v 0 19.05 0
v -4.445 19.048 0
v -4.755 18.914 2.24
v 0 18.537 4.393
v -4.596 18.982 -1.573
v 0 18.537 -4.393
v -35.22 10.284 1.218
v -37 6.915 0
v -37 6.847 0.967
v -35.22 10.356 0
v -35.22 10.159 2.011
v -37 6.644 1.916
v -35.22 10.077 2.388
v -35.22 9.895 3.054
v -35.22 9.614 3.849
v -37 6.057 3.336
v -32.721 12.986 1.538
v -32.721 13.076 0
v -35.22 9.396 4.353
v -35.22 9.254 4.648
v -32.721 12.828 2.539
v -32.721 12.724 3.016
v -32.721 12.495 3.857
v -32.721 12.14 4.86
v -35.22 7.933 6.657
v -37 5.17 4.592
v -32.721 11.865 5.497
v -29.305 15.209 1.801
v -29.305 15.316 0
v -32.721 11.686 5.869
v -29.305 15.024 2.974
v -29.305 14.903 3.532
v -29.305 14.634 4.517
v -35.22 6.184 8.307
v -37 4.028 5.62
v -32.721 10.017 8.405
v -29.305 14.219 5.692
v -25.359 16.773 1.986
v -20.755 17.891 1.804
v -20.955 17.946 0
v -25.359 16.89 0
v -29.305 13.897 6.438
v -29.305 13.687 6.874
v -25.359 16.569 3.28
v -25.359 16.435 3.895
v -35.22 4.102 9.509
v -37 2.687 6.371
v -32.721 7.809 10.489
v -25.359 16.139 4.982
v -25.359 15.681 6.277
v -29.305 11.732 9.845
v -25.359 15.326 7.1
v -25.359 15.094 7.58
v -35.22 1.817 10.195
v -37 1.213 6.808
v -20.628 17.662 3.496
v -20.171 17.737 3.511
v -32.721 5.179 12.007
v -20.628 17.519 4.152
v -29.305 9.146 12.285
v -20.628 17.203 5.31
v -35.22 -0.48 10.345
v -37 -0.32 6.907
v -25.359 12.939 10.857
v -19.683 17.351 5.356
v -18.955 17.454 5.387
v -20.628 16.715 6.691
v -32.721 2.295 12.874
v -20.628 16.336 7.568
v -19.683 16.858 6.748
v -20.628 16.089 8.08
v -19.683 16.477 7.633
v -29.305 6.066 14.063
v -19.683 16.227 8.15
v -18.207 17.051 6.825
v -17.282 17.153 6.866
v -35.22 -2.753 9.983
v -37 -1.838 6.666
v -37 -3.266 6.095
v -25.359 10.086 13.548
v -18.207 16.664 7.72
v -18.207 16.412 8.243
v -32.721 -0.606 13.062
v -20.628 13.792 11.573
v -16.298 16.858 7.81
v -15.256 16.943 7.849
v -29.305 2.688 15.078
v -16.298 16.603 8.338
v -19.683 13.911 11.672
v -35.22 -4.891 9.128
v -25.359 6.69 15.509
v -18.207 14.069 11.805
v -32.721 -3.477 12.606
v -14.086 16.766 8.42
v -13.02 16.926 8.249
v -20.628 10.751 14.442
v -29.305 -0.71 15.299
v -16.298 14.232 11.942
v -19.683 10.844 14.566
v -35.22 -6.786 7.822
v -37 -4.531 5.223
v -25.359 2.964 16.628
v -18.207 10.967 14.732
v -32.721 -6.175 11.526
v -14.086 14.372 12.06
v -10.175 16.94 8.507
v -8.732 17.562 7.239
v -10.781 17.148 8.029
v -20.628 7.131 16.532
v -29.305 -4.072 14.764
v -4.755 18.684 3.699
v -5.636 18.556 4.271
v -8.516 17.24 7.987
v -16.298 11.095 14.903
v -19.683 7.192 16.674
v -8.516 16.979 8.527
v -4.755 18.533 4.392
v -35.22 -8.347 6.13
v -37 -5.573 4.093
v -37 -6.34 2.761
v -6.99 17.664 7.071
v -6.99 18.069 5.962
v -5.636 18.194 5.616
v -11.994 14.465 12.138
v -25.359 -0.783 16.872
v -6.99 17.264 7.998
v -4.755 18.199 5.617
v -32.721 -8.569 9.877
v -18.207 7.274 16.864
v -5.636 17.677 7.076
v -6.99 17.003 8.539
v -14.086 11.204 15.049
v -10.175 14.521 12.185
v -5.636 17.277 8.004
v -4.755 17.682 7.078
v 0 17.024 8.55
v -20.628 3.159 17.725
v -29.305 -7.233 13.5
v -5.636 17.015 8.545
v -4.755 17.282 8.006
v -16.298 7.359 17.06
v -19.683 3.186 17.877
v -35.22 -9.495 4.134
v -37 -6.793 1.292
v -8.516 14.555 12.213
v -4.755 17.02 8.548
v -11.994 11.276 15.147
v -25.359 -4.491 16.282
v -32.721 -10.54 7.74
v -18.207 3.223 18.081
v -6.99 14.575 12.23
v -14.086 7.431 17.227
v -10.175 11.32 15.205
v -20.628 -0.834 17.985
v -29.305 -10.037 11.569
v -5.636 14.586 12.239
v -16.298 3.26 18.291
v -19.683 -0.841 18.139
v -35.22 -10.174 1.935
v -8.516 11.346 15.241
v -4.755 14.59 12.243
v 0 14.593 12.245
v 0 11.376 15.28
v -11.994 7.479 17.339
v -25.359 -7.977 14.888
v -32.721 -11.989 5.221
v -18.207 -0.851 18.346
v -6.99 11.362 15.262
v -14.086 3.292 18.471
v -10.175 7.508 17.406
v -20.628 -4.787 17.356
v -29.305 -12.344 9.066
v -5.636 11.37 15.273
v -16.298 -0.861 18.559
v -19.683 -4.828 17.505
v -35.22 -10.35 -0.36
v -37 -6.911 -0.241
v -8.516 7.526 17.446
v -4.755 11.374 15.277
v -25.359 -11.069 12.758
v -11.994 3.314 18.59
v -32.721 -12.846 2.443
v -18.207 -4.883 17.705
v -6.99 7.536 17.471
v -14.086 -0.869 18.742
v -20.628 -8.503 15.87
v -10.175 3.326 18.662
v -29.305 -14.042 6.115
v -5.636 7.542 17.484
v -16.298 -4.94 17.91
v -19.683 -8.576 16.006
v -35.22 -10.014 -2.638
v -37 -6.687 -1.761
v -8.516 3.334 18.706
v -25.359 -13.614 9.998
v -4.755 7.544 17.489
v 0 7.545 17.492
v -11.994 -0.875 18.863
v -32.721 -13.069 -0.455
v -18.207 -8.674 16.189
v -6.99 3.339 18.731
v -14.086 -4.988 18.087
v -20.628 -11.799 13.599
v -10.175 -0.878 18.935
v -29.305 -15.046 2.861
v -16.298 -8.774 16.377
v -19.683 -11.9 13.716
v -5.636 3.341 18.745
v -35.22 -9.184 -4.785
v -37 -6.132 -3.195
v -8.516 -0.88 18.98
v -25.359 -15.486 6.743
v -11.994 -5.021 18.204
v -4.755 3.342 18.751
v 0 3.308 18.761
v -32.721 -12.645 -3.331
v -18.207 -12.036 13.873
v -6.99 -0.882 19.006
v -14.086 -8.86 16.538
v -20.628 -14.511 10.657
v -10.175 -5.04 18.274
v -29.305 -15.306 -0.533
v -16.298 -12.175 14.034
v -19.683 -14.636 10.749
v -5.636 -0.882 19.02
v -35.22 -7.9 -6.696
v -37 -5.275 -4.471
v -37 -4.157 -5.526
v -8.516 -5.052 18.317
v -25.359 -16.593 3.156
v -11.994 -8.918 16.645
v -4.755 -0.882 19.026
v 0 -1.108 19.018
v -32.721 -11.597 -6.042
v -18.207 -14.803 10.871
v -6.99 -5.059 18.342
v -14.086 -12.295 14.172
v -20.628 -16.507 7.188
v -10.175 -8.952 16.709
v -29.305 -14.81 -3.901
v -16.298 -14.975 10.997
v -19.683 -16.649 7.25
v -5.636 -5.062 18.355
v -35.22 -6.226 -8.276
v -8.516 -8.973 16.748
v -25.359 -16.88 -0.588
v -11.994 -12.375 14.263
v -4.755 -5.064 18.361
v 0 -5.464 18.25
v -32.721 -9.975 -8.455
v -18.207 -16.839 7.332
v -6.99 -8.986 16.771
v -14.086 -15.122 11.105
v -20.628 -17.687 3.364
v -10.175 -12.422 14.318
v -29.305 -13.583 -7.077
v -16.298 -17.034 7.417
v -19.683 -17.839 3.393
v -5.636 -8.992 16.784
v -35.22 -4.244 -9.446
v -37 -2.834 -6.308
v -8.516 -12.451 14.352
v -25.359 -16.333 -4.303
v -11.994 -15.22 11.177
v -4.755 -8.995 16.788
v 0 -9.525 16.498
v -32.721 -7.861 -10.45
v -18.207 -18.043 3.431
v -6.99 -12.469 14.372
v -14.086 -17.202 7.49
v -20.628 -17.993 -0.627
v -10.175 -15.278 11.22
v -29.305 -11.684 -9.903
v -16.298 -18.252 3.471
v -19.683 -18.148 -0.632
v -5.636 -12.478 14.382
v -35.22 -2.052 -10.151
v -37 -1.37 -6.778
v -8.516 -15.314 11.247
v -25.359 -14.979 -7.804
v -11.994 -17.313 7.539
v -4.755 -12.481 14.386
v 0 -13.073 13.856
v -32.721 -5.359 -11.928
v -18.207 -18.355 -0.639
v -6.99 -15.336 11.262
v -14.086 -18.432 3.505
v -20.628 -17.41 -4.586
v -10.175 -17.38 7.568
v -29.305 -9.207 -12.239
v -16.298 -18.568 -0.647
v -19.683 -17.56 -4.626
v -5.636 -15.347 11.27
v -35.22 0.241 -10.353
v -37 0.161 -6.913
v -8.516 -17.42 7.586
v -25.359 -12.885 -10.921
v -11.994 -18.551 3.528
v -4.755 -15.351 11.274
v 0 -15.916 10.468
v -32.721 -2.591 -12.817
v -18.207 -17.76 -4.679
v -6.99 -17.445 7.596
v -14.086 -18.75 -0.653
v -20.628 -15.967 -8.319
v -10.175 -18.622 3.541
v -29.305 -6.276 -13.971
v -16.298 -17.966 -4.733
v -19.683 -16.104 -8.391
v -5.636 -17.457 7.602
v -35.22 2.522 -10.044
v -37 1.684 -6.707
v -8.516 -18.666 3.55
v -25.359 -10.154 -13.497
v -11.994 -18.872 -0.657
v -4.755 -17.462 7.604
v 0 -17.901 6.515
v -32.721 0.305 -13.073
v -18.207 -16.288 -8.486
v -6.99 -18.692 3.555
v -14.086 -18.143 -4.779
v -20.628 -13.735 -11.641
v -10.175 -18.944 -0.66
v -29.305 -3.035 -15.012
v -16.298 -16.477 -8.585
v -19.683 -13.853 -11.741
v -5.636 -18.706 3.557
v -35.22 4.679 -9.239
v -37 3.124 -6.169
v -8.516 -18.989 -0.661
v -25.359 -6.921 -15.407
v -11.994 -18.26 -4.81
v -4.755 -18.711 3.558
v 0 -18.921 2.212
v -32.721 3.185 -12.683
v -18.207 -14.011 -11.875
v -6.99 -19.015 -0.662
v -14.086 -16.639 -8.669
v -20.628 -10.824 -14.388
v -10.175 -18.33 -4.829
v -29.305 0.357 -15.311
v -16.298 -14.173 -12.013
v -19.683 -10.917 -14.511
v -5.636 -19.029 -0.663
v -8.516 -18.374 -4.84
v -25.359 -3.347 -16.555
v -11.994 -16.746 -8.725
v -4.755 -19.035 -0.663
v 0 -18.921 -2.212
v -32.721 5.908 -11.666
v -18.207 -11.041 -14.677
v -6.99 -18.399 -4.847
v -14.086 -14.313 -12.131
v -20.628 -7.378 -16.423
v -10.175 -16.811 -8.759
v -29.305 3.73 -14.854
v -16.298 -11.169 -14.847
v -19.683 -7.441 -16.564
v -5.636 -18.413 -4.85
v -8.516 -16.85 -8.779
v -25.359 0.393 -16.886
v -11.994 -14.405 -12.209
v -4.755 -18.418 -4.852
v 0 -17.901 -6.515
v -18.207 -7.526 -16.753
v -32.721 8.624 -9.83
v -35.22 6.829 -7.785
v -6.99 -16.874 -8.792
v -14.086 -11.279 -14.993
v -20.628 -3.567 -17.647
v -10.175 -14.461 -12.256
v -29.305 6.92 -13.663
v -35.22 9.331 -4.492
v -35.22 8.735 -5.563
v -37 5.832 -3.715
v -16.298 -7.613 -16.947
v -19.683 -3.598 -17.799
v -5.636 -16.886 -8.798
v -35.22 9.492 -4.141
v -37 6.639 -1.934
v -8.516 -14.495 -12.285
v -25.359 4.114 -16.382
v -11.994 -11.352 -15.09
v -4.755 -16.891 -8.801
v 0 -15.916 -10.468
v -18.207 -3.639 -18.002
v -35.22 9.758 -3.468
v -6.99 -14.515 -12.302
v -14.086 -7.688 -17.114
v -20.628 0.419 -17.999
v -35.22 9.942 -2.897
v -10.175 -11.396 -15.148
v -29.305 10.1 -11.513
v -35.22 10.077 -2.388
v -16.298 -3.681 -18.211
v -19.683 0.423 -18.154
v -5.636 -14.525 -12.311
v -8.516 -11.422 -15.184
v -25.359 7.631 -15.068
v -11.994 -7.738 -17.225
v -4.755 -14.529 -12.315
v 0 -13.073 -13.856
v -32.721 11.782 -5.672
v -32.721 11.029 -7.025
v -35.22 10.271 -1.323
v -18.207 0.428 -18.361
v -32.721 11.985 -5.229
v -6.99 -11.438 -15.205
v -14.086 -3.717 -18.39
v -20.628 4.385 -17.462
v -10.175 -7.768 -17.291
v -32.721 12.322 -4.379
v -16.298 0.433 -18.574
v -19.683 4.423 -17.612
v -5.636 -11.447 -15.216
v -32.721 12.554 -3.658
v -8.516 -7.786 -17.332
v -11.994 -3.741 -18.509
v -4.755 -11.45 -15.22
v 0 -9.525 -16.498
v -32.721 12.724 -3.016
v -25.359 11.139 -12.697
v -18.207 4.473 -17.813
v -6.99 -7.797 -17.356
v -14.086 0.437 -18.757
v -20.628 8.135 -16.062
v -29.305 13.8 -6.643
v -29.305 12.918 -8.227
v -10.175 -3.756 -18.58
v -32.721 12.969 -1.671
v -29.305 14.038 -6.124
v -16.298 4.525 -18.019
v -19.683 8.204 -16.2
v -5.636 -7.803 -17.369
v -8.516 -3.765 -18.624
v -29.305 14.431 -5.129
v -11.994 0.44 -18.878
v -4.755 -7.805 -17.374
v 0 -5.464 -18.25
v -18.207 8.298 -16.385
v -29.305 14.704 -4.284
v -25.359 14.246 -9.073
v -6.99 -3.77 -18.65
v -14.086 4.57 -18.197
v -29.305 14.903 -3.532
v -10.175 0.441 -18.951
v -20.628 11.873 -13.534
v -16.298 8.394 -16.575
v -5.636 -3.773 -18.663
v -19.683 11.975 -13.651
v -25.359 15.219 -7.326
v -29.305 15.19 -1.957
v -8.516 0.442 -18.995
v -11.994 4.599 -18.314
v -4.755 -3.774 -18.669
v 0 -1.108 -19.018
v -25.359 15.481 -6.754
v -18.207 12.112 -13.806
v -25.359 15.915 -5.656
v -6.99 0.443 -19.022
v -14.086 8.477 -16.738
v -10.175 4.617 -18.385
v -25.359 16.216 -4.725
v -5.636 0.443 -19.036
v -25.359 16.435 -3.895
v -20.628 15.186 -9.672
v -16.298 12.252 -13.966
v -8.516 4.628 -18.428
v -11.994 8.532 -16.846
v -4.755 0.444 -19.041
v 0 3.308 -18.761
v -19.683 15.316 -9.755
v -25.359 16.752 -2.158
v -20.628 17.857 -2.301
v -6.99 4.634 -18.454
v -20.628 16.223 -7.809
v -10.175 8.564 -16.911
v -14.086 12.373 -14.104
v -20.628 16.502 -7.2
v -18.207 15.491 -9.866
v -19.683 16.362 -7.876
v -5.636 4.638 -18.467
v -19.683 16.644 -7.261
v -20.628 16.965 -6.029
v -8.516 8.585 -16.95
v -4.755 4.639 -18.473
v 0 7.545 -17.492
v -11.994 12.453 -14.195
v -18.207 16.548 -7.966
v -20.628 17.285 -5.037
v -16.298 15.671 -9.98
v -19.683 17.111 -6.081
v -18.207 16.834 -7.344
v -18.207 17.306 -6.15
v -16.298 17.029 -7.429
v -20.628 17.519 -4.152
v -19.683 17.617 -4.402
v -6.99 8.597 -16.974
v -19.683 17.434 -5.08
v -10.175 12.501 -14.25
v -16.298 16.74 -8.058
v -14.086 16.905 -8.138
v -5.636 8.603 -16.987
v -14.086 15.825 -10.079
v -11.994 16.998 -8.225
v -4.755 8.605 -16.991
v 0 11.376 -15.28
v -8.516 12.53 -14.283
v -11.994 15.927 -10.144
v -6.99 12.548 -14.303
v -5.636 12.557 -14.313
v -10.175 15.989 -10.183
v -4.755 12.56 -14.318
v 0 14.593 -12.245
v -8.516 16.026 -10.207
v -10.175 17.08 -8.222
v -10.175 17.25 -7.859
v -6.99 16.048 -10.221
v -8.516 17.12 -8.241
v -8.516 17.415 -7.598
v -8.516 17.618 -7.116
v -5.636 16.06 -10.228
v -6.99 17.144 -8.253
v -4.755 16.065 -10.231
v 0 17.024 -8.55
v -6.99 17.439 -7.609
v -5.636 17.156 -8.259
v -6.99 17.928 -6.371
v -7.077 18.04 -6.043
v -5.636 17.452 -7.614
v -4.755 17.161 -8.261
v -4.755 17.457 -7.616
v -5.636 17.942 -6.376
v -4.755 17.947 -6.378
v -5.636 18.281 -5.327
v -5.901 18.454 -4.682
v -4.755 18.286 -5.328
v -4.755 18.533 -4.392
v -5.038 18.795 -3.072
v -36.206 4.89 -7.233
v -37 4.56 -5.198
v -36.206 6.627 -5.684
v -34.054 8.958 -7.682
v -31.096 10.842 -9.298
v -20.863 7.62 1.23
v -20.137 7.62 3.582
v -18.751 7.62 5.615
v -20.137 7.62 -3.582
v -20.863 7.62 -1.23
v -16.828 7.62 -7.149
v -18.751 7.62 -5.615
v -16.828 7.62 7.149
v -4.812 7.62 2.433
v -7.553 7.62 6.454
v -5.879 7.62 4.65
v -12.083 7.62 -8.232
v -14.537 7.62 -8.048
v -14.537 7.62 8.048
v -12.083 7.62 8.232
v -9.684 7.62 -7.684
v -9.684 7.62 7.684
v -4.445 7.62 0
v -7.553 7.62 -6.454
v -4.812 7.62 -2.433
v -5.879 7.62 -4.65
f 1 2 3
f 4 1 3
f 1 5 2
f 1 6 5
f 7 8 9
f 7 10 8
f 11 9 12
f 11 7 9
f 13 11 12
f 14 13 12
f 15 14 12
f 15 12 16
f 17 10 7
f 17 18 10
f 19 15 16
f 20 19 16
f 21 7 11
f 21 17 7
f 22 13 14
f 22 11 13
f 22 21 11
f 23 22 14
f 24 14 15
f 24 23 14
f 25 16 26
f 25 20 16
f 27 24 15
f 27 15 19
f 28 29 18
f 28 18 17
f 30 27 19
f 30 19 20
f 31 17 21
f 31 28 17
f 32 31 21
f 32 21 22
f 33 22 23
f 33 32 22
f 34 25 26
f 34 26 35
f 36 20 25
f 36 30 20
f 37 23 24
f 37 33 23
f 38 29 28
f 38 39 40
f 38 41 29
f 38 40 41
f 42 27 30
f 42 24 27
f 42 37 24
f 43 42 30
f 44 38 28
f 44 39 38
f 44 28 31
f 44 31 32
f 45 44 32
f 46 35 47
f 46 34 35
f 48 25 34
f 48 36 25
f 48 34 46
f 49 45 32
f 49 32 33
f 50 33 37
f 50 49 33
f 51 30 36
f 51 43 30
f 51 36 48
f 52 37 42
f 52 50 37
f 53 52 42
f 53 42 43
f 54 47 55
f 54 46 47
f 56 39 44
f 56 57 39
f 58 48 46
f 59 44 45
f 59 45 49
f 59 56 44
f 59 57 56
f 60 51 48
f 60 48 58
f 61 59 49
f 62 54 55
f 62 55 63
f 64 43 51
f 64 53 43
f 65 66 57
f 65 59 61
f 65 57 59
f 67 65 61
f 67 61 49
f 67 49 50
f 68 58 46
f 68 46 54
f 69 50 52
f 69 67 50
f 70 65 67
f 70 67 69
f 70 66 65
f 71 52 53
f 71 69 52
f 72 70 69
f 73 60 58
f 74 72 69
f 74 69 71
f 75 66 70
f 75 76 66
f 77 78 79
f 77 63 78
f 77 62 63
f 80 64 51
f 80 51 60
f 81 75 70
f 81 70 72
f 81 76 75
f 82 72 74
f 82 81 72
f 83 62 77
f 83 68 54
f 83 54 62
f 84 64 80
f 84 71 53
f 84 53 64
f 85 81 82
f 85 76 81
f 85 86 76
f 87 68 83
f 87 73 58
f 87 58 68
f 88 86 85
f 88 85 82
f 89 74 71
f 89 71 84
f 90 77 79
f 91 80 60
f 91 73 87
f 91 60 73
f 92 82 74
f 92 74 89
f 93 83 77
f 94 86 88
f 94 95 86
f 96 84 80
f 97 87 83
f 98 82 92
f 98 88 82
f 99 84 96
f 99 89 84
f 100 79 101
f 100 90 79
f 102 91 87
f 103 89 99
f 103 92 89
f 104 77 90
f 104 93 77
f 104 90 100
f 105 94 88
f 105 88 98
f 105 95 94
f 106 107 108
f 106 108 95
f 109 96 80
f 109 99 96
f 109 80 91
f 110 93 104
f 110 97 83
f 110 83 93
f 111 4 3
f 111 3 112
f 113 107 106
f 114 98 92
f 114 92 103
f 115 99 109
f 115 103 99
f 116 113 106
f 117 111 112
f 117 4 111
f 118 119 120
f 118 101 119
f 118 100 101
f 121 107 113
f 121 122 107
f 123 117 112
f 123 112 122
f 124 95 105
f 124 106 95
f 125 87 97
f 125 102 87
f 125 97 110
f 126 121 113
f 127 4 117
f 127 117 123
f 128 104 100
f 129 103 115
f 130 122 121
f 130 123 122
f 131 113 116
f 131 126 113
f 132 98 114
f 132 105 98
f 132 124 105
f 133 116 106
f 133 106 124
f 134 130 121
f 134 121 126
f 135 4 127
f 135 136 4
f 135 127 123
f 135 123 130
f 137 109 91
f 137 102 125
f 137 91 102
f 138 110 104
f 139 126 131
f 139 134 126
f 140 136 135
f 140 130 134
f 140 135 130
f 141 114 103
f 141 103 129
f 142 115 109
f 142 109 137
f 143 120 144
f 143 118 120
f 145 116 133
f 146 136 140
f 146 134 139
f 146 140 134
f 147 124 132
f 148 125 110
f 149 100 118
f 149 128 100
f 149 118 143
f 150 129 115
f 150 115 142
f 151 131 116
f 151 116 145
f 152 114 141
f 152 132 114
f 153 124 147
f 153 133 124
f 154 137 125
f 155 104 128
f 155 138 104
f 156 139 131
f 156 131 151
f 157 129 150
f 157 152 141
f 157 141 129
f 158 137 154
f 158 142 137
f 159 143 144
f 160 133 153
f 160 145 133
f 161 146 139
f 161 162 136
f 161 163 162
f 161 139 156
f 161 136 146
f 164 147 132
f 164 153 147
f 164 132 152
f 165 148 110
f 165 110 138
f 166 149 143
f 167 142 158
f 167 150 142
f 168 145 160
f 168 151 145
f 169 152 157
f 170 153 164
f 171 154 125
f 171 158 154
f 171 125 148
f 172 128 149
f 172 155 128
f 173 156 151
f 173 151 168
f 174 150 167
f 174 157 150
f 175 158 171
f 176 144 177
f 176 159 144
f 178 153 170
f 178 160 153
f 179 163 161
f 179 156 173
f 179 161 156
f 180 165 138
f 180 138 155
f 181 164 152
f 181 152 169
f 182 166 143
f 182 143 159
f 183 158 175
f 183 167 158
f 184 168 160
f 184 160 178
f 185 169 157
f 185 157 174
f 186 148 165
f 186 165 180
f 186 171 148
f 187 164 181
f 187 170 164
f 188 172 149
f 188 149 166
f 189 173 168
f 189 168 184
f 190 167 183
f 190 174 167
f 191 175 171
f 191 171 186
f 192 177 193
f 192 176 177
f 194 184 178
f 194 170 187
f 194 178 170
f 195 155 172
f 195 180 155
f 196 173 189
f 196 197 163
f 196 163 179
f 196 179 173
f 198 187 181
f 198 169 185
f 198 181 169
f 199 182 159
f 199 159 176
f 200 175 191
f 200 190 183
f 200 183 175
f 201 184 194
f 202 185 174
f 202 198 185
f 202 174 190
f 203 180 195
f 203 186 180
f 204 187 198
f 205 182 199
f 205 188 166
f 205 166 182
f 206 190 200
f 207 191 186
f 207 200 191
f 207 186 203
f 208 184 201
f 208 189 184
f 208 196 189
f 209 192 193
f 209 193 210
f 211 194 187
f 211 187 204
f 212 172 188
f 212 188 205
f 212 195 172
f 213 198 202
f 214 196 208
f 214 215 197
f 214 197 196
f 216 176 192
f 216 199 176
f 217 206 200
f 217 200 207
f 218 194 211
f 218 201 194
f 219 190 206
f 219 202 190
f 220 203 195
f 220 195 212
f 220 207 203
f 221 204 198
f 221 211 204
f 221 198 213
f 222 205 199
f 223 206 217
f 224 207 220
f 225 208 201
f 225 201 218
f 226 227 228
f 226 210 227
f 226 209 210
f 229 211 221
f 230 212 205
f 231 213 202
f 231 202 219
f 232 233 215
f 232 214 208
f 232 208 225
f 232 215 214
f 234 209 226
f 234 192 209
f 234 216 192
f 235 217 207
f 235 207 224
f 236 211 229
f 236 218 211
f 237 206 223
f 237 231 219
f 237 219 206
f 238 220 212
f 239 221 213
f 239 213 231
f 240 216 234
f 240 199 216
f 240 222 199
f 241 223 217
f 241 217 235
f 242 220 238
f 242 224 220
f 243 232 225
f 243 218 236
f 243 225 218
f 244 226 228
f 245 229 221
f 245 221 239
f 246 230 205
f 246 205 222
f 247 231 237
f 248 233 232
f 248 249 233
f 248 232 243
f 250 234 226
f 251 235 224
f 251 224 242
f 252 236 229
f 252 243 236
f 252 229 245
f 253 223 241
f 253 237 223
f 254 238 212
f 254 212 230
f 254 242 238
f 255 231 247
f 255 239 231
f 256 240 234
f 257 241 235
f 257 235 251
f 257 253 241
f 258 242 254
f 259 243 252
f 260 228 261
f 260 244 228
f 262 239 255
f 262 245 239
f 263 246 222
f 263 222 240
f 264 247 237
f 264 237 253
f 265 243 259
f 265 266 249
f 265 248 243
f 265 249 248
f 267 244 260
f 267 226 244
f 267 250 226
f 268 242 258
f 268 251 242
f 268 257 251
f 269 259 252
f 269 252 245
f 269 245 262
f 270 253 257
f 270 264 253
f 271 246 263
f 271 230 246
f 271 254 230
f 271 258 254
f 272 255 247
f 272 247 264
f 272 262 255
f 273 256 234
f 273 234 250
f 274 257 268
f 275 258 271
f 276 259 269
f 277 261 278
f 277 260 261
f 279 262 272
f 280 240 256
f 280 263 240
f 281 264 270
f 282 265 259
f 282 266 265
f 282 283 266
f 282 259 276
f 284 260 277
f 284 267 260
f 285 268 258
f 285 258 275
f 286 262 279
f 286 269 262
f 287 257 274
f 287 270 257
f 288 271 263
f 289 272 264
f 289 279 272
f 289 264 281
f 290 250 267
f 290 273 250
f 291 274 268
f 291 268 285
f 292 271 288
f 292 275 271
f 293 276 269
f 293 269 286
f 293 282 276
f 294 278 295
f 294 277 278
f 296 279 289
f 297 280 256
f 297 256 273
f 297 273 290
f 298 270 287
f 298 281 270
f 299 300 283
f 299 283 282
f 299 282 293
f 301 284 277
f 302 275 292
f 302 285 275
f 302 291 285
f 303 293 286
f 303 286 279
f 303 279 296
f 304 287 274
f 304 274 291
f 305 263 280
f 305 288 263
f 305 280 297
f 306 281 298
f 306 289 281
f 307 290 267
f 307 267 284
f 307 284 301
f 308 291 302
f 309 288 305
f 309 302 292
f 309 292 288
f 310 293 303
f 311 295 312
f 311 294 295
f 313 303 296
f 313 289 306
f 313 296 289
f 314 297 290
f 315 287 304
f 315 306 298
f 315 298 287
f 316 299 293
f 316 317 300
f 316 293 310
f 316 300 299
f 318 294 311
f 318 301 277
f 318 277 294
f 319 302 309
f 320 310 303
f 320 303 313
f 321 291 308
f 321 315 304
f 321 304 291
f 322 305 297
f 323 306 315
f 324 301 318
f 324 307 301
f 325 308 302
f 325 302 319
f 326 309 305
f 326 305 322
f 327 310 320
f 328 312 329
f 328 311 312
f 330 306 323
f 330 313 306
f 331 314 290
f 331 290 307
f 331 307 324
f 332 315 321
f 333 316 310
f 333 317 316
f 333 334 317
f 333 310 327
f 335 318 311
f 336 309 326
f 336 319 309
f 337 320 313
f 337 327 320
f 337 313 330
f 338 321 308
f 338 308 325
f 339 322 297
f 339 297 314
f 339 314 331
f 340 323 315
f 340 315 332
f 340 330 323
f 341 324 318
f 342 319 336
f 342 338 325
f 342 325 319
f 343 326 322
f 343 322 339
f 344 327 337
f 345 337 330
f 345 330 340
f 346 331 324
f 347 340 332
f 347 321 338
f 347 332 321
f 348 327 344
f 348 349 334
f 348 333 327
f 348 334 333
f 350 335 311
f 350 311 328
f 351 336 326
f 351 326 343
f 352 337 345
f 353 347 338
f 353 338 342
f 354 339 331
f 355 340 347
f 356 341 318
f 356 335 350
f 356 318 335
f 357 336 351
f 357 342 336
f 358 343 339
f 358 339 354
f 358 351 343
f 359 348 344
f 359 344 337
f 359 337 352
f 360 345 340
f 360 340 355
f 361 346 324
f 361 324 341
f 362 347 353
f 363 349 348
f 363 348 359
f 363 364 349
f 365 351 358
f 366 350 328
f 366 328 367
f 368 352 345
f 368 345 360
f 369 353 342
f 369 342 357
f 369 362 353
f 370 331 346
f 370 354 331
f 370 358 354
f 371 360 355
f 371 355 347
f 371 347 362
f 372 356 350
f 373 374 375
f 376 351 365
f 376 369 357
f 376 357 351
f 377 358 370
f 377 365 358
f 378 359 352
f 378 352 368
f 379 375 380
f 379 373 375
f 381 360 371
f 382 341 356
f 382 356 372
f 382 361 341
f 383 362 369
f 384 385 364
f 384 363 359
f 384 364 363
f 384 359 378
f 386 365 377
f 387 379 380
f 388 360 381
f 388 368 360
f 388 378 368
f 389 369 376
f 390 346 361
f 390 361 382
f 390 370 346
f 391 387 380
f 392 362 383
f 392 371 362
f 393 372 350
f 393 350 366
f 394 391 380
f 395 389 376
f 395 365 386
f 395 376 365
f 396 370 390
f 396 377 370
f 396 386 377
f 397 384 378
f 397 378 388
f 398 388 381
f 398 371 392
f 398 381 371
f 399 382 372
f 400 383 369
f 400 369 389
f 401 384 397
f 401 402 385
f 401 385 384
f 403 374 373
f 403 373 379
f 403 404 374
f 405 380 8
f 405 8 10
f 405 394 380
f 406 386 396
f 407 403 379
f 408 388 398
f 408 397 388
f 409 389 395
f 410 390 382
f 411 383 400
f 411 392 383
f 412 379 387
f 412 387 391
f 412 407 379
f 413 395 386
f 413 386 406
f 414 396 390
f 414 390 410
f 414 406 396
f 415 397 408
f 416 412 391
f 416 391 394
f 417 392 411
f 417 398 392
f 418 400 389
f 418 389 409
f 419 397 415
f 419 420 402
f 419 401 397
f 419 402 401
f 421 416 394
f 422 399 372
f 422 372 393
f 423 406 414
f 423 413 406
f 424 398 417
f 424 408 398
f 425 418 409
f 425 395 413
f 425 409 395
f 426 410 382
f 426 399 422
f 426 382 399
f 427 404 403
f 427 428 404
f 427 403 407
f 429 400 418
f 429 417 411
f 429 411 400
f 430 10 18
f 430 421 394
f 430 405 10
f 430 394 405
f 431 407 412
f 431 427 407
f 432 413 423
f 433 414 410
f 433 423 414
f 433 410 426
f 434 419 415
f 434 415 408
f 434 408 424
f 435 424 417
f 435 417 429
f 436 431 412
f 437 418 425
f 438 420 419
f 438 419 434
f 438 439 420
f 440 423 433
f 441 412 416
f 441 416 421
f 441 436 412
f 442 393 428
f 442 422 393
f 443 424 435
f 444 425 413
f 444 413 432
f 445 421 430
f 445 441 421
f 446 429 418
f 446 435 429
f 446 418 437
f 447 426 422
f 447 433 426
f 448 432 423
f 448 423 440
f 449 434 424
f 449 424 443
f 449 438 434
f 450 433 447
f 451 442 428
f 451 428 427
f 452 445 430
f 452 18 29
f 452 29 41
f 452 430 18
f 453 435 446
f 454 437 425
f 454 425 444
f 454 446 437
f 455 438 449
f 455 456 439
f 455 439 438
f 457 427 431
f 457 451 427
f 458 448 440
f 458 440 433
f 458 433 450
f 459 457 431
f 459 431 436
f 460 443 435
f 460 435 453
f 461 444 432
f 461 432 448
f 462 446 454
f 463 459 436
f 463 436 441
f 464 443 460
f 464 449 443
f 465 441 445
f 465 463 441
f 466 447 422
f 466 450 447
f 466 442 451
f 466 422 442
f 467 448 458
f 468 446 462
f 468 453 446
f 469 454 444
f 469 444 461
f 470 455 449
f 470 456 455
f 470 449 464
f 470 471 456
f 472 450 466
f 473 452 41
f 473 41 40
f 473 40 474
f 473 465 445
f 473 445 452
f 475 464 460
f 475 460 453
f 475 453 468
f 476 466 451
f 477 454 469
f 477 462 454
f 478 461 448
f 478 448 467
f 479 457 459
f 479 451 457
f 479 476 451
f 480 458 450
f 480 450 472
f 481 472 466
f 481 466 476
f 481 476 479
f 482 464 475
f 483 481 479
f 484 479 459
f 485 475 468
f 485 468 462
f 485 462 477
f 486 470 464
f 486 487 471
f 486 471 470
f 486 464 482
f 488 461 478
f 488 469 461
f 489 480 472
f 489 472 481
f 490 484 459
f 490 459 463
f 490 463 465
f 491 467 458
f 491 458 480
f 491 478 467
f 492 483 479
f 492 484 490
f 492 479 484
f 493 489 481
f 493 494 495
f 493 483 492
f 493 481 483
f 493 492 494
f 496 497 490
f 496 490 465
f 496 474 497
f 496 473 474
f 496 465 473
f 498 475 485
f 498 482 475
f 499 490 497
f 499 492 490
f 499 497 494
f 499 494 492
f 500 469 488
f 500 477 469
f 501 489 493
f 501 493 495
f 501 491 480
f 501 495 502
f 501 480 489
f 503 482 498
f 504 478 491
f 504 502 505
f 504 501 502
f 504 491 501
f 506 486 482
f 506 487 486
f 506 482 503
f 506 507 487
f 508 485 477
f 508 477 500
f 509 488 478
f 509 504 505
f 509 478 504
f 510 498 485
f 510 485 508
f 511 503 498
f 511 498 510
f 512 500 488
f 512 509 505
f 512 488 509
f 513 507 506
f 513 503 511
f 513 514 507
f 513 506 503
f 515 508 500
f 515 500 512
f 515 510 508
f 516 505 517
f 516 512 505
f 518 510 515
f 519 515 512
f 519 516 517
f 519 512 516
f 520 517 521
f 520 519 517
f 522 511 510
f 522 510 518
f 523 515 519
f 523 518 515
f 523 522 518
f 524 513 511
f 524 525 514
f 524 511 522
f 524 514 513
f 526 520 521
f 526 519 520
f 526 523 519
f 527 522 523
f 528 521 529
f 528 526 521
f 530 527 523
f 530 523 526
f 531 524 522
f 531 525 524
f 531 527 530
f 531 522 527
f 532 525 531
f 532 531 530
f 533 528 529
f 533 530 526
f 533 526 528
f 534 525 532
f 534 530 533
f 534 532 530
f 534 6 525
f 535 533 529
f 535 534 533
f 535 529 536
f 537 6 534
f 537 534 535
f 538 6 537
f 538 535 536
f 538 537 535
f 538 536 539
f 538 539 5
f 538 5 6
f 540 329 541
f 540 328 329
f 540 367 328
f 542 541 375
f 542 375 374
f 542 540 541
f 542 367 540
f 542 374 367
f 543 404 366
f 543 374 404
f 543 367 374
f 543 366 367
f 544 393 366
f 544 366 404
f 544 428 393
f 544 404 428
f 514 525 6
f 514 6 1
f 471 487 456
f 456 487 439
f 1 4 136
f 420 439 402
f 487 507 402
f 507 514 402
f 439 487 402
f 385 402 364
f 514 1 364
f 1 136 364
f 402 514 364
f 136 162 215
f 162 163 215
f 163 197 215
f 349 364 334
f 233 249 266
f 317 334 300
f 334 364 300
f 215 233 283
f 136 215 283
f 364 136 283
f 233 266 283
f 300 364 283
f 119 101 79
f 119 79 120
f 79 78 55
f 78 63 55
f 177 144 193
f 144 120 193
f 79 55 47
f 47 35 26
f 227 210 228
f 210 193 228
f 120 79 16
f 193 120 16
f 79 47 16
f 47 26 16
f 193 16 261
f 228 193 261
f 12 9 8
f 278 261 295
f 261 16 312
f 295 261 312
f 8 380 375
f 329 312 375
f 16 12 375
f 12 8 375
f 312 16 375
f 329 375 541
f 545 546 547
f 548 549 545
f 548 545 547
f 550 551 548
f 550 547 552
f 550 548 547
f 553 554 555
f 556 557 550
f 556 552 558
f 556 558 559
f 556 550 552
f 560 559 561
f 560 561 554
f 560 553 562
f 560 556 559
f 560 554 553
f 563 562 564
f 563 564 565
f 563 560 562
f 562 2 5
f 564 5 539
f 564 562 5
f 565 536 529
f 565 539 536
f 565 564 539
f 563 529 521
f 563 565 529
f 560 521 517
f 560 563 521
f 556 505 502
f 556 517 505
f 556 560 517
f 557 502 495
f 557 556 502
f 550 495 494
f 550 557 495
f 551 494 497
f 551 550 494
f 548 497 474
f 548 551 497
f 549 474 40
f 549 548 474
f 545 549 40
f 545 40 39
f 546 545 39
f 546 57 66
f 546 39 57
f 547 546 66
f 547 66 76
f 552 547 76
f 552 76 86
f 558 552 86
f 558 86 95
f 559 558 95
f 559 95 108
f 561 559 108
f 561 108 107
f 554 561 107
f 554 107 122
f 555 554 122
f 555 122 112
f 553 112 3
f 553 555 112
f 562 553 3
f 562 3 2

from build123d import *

# Parameters (mm, degrees)
SKETCH3_R          = 8.255
CUT_EXTRUDE2_DEPTH = 12.430942443
SKETCH4_R          = 12.397062146
CUT_EXTRUDE3_DEPTH = 10


with BuildPart() as part:
    # Sketch1 → Revolve1 (revolve)
    with BuildSketch(Plane.XY):
        with BuildLine():
            Line((-38.1, 0), (0, 0))
            Line((0, 0), (0, 19.05))
            add(Edge.make_bspline(
                [(-38.1, 0), (-38.1, 19.511634231), (-17.237160038, 19.05), (0, 19.05)],
                knots=[0, 0, 0, 0, 1, 1, 1, 1], degree=3))
        make_face()
    revolve(axis=Axis((-71.948497854, 0, 0), (1, 0, 0)))

    # Sketch3 → Cut-Extrude2 (cut, through all)
    with BuildSketch(Plane(origin=(0, 7.62, 0), x_dir=(1, 0, 0), z_dir=(0, 1, 0))):
        with Locations((-12.7, 0)):
            Circle(SKETCH3_R)
    extrude(amount=CUT_EXTRUDE2_DEPTH, mode=Mode.SUBTRACT)

    # Sketch4 → Cut-Extrude3 (cut)
    with BuildSketch(Plane(origin=(-37, 0, 0), x_dir=(0, 0, -1), z_dir=(1, 0, 0))):
        Circle(SKETCH4_R)
    extrude(amount=-CUT_EXTRUDE3_DEPTH, mode=Mode.SUBTRACT)


solid = part.part
